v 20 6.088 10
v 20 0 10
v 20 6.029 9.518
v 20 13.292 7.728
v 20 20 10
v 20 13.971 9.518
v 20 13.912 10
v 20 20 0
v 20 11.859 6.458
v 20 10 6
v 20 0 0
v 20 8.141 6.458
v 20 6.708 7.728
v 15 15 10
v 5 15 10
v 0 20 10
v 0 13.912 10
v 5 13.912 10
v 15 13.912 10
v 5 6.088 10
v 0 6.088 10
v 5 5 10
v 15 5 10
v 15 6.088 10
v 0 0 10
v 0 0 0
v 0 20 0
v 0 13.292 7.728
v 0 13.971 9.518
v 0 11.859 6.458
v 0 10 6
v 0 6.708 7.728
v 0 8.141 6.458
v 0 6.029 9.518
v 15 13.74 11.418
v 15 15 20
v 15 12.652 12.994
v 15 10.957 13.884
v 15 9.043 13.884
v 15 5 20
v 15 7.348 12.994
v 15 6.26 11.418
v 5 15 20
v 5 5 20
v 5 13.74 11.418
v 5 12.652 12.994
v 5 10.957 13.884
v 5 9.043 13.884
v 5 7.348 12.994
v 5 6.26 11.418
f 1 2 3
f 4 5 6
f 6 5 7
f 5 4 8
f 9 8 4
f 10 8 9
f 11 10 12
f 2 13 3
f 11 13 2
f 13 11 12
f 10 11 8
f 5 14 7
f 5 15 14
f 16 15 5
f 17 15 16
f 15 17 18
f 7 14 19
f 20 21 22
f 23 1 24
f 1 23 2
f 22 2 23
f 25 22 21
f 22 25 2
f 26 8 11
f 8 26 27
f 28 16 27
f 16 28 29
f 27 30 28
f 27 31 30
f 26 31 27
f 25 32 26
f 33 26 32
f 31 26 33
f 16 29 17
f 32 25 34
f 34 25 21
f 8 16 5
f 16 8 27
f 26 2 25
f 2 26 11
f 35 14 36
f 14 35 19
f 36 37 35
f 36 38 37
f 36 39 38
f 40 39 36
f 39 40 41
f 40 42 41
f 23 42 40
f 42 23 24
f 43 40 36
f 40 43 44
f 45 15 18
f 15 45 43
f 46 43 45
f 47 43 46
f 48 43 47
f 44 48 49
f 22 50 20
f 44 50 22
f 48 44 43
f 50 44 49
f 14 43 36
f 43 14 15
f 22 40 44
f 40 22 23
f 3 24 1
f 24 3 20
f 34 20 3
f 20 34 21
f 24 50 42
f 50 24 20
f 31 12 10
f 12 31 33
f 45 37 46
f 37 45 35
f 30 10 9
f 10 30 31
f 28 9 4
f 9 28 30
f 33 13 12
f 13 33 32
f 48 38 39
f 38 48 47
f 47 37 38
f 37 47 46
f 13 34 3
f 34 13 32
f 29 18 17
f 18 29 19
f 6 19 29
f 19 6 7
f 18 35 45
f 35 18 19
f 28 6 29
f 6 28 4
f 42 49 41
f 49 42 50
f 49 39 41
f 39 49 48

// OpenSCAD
difference(){
    union(){
        cube([20,20,10]);
        translate([5,5,0]) cube([10,10,20]);
    }
    translate([-1,10,10])
        rotate([0,90,0])
            cylinder(d=8,h=22);
}
